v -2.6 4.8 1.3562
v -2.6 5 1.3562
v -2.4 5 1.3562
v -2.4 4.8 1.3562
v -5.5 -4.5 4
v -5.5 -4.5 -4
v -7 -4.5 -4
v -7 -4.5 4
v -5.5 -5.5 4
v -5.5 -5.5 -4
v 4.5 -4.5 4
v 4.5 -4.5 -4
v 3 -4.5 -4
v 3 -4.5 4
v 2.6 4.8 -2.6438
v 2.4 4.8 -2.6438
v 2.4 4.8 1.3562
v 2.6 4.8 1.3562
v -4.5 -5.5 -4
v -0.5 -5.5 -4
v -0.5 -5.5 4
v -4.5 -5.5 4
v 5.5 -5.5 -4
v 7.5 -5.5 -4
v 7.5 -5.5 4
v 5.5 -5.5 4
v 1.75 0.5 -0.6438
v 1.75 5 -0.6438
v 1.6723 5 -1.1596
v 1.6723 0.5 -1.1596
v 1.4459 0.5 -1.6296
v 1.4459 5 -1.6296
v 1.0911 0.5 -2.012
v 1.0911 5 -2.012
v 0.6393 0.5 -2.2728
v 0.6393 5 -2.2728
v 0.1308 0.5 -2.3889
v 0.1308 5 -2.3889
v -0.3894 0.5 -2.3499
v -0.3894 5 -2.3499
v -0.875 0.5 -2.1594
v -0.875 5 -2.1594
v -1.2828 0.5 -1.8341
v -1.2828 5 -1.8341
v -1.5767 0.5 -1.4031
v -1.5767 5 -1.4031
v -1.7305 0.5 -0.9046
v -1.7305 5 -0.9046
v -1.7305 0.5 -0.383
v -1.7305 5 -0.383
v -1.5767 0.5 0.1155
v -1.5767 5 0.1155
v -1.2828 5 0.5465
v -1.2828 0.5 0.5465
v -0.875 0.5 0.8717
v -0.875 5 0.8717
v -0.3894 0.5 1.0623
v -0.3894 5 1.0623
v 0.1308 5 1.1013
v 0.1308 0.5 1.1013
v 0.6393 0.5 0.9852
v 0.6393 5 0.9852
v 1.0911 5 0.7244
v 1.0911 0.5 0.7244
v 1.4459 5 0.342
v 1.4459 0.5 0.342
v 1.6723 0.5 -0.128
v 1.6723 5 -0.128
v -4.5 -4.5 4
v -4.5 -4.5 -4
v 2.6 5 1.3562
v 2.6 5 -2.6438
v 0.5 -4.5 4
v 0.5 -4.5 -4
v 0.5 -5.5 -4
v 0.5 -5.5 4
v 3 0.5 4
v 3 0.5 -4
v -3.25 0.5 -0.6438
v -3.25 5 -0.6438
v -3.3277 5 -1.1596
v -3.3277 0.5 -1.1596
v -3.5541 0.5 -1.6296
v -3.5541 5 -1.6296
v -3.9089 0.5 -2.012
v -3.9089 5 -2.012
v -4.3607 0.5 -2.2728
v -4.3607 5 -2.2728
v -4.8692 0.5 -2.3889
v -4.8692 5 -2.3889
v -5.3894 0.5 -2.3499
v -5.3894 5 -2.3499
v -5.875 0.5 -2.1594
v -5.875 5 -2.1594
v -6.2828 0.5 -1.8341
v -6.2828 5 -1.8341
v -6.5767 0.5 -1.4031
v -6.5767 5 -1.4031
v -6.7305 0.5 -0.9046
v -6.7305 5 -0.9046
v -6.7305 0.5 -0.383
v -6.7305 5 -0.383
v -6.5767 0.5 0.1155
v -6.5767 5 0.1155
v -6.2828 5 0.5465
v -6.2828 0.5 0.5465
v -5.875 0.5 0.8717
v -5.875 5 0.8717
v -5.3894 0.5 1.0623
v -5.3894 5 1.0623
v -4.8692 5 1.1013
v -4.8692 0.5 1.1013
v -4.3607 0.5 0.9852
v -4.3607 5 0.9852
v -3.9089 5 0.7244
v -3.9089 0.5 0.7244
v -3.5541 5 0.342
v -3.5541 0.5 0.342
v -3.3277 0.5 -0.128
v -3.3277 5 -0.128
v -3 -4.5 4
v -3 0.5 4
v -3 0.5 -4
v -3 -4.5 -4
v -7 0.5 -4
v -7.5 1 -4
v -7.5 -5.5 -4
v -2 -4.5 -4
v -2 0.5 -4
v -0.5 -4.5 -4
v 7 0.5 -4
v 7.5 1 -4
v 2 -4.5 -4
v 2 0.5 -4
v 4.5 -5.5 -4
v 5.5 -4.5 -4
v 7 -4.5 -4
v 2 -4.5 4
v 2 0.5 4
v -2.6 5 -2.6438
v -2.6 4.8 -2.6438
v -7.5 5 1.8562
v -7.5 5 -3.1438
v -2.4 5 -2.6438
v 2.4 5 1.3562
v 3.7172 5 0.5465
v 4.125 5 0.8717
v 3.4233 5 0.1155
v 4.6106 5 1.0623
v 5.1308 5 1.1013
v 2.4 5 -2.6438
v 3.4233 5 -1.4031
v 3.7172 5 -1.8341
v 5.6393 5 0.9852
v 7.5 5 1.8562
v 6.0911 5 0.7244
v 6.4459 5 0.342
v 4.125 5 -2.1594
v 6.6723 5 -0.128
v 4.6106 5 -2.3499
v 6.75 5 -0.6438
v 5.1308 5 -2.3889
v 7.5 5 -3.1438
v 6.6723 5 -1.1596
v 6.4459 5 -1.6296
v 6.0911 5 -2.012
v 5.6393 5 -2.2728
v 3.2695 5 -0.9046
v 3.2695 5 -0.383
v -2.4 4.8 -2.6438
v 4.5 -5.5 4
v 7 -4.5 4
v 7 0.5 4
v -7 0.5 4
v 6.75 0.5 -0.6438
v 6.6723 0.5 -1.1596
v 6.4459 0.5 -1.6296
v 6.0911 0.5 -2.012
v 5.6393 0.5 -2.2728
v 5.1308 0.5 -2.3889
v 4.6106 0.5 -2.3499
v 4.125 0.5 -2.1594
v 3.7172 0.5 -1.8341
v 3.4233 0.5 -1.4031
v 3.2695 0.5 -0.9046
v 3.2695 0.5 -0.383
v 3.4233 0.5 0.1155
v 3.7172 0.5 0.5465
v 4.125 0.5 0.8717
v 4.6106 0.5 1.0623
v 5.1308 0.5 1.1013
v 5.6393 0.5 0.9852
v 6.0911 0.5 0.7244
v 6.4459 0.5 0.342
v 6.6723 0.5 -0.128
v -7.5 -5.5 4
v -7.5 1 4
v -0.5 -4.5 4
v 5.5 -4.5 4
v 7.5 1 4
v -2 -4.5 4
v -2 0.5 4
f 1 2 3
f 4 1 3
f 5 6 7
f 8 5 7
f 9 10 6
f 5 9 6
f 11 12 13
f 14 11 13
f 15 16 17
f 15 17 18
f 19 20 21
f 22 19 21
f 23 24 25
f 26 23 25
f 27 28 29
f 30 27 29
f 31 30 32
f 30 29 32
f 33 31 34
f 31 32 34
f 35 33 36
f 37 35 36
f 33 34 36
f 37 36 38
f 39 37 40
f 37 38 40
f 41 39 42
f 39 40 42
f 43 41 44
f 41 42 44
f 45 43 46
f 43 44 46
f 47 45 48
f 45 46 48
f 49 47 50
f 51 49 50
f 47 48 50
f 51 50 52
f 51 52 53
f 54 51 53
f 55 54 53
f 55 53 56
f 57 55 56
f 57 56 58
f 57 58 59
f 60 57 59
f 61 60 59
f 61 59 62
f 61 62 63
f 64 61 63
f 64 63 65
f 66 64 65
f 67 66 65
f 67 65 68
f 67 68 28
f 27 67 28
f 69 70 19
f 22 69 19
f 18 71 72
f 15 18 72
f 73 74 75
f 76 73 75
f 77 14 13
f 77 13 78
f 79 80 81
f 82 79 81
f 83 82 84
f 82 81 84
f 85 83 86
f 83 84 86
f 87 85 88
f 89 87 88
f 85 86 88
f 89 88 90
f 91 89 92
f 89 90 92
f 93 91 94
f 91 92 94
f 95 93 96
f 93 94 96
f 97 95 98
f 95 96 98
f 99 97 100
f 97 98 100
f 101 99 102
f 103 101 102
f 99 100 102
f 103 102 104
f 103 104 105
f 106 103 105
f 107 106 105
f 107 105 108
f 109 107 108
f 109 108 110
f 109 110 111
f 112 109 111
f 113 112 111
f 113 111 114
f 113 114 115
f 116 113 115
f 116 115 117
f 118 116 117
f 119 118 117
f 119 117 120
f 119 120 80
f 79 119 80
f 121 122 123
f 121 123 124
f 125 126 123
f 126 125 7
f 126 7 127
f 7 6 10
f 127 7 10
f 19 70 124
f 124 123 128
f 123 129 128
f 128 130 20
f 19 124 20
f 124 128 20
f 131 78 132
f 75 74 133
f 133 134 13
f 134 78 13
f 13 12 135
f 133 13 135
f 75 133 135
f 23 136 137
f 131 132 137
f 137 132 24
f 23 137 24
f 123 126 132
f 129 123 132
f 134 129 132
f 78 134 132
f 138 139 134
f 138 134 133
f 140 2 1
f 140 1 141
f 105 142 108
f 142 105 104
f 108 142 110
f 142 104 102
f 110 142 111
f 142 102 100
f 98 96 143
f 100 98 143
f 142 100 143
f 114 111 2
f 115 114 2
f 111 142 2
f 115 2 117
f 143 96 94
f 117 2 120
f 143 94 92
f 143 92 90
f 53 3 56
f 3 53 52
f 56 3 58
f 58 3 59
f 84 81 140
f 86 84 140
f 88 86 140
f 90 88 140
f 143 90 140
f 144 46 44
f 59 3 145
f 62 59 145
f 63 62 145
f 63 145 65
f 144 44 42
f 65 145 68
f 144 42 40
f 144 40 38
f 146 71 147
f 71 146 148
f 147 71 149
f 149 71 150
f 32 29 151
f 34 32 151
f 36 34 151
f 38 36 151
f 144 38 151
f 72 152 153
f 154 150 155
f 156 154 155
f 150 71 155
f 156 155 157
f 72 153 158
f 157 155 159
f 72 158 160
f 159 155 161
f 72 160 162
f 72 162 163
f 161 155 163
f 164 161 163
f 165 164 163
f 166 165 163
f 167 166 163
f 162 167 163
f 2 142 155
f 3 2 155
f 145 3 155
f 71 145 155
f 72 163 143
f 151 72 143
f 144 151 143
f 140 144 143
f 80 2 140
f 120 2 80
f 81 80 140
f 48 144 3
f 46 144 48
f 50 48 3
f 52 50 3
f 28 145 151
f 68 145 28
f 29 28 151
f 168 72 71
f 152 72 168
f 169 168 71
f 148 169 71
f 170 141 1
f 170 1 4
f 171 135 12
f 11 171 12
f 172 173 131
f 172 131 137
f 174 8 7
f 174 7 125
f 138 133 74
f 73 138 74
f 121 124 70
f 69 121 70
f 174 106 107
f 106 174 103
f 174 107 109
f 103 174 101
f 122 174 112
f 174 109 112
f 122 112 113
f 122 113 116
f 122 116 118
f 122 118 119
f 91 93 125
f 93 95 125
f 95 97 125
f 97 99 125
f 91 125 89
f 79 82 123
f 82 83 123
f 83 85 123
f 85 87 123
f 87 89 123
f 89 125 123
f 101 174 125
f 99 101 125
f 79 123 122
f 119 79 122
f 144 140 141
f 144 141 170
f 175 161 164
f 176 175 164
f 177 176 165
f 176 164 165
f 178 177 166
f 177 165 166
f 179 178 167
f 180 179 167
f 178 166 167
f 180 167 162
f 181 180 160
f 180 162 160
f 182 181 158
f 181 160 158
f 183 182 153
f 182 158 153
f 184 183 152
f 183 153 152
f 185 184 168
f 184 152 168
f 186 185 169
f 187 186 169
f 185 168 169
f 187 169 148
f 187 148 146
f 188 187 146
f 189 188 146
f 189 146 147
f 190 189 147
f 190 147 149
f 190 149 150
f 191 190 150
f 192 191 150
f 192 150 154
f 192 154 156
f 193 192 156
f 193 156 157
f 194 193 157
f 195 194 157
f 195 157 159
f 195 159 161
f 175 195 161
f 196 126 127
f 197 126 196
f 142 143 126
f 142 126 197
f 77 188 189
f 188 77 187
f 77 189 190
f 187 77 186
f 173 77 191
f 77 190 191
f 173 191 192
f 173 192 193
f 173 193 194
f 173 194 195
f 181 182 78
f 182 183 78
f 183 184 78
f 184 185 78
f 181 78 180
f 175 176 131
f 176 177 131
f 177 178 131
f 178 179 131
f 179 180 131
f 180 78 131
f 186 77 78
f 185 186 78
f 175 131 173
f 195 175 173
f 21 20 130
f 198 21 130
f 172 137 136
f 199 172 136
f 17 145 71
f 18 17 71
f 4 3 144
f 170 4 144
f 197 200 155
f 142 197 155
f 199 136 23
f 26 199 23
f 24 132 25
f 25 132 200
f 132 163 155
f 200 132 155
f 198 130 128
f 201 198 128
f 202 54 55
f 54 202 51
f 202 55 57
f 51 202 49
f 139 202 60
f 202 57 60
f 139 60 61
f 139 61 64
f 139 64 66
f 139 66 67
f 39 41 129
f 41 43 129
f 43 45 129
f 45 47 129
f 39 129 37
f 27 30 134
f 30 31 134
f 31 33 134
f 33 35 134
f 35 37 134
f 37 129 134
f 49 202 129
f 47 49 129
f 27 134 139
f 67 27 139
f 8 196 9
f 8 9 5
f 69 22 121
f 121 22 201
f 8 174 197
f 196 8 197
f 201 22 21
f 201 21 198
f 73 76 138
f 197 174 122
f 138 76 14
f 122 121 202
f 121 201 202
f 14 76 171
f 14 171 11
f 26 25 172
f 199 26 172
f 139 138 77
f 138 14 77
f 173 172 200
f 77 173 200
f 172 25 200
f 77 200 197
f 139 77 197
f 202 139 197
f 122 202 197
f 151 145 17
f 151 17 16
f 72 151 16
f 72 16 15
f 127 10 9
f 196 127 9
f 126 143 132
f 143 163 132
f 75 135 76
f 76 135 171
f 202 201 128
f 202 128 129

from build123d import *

# Parameters (mm, degrees)
Y_KSEKLIK_EKSTR_ZYON1_DEPTH      = 7.5
Y_KSEKLIK_EKSTR_ZYON1_DEPTH_BACK = 7.5
KES_EKSTR_ZYON1_DEPTH            = 13.267844146
IZIM3_R                          = 1.75
KES_EKSTR_ZYON2_DEPTH            = 7.5
IZIM4_W                          = 0.2
IZIM4_H                          = 4
KES_EKSTR_ZYON3_DEPTH            = 0.2


with BuildPart() as part:
    # Çizim1 → Yükseklik-Ekstrüzyon1 (new, two sides: drawn at the far end of the back side and taken through both)
    with BuildSketch(Plane(origin=(0, 0, 0), x_dir=(0, 0, -1), z_dir=(1, 0, 0)).offset(-Y_KSEKLIK_EKSTR_ZYON1_DEPTH_BACK)):
        Polygon((-1.856187291, 5), (3.143812709, 5), (4, 1), (4, -5.5), (-4, -5.5), (-4, 1), align=None)
    extrude(amount=Y_KSEKLIK_EKSTR_ZYON1_DEPTH + Y_KSEKLIK_EKSTR_ZYON1_DEPTH_BACK)

    # Çizim2 → Kes-Ekstrüzyon1 (cut, through all)
    with BuildSketch(Plane(origin=(0, 0, -4), x_dir=(-1, 0, 0), z_dir=(0, 0, -1))):
        Polygon((-0.5, -4.5), (-0.5, -5.5), (0.5, -5.5), (0.5, -4.5), (2, -4.5), (2, 0.5), (-2, 0.5), (-2, -4.5), align=None)
        Polygon((3, 0.5), (3, -4.5), (4.5, -4.5), (4.5, -5.5), (5.5, -5.5), (5.5, -4.5), (7, -4.5), (7, 0.5), align=None)
        Polygon((-7, 0.5), (-7, -4.5), (-5.5, -4.5), (-5.5, -5.5), (-4.5, -5.5), (-4.5, -4.5), (-3, -4.5), (-3, 0.5), align=None)
    extrude(amount=-KES_EKSTR_ZYON1_DEPTH, mode=Mode.SUBTRACT)

    # Çizim3 → Kes-Ekstrüzyon2 (cut)
    with BuildSketch(Plane(origin=(0, 5, 0), x_dir=(1, 0, 0), z_dir=(0, 1, 0))):
        with Locations((0, 0.643812709)):
            Circle(IZIM3_R)
        with Locations((-5, 0.643812709)):
            Circle(IZIM3_R)
        with Locations((5, 0.643812709)):
            Circle(IZIM3_R)
    extrude(amount=-KES_EKSTR_ZYON2_DEPTH, mode=Mode.SUBTRACT)

    # Çizim4 → Kes-Ekstrüzyon3 (cut)
    with BuildSketch(Plane(origin=(0, 5, 0), x_dir=(1, 0, 0), z_dir=(0, 1, 0))):
        with Locations((-2.5, 0.643812709)):
            Rectangle(IZIM4_W, IZIM4_H)
        with Locations((2.5, 0.643812709)):
            Rectangle(IZIM4_W, IZIM4_H)
    extrude(amount=-KES_EKSTR_ZYON3_DEPTH, mode=Mode.SUBTRACT)


solid = part.part
